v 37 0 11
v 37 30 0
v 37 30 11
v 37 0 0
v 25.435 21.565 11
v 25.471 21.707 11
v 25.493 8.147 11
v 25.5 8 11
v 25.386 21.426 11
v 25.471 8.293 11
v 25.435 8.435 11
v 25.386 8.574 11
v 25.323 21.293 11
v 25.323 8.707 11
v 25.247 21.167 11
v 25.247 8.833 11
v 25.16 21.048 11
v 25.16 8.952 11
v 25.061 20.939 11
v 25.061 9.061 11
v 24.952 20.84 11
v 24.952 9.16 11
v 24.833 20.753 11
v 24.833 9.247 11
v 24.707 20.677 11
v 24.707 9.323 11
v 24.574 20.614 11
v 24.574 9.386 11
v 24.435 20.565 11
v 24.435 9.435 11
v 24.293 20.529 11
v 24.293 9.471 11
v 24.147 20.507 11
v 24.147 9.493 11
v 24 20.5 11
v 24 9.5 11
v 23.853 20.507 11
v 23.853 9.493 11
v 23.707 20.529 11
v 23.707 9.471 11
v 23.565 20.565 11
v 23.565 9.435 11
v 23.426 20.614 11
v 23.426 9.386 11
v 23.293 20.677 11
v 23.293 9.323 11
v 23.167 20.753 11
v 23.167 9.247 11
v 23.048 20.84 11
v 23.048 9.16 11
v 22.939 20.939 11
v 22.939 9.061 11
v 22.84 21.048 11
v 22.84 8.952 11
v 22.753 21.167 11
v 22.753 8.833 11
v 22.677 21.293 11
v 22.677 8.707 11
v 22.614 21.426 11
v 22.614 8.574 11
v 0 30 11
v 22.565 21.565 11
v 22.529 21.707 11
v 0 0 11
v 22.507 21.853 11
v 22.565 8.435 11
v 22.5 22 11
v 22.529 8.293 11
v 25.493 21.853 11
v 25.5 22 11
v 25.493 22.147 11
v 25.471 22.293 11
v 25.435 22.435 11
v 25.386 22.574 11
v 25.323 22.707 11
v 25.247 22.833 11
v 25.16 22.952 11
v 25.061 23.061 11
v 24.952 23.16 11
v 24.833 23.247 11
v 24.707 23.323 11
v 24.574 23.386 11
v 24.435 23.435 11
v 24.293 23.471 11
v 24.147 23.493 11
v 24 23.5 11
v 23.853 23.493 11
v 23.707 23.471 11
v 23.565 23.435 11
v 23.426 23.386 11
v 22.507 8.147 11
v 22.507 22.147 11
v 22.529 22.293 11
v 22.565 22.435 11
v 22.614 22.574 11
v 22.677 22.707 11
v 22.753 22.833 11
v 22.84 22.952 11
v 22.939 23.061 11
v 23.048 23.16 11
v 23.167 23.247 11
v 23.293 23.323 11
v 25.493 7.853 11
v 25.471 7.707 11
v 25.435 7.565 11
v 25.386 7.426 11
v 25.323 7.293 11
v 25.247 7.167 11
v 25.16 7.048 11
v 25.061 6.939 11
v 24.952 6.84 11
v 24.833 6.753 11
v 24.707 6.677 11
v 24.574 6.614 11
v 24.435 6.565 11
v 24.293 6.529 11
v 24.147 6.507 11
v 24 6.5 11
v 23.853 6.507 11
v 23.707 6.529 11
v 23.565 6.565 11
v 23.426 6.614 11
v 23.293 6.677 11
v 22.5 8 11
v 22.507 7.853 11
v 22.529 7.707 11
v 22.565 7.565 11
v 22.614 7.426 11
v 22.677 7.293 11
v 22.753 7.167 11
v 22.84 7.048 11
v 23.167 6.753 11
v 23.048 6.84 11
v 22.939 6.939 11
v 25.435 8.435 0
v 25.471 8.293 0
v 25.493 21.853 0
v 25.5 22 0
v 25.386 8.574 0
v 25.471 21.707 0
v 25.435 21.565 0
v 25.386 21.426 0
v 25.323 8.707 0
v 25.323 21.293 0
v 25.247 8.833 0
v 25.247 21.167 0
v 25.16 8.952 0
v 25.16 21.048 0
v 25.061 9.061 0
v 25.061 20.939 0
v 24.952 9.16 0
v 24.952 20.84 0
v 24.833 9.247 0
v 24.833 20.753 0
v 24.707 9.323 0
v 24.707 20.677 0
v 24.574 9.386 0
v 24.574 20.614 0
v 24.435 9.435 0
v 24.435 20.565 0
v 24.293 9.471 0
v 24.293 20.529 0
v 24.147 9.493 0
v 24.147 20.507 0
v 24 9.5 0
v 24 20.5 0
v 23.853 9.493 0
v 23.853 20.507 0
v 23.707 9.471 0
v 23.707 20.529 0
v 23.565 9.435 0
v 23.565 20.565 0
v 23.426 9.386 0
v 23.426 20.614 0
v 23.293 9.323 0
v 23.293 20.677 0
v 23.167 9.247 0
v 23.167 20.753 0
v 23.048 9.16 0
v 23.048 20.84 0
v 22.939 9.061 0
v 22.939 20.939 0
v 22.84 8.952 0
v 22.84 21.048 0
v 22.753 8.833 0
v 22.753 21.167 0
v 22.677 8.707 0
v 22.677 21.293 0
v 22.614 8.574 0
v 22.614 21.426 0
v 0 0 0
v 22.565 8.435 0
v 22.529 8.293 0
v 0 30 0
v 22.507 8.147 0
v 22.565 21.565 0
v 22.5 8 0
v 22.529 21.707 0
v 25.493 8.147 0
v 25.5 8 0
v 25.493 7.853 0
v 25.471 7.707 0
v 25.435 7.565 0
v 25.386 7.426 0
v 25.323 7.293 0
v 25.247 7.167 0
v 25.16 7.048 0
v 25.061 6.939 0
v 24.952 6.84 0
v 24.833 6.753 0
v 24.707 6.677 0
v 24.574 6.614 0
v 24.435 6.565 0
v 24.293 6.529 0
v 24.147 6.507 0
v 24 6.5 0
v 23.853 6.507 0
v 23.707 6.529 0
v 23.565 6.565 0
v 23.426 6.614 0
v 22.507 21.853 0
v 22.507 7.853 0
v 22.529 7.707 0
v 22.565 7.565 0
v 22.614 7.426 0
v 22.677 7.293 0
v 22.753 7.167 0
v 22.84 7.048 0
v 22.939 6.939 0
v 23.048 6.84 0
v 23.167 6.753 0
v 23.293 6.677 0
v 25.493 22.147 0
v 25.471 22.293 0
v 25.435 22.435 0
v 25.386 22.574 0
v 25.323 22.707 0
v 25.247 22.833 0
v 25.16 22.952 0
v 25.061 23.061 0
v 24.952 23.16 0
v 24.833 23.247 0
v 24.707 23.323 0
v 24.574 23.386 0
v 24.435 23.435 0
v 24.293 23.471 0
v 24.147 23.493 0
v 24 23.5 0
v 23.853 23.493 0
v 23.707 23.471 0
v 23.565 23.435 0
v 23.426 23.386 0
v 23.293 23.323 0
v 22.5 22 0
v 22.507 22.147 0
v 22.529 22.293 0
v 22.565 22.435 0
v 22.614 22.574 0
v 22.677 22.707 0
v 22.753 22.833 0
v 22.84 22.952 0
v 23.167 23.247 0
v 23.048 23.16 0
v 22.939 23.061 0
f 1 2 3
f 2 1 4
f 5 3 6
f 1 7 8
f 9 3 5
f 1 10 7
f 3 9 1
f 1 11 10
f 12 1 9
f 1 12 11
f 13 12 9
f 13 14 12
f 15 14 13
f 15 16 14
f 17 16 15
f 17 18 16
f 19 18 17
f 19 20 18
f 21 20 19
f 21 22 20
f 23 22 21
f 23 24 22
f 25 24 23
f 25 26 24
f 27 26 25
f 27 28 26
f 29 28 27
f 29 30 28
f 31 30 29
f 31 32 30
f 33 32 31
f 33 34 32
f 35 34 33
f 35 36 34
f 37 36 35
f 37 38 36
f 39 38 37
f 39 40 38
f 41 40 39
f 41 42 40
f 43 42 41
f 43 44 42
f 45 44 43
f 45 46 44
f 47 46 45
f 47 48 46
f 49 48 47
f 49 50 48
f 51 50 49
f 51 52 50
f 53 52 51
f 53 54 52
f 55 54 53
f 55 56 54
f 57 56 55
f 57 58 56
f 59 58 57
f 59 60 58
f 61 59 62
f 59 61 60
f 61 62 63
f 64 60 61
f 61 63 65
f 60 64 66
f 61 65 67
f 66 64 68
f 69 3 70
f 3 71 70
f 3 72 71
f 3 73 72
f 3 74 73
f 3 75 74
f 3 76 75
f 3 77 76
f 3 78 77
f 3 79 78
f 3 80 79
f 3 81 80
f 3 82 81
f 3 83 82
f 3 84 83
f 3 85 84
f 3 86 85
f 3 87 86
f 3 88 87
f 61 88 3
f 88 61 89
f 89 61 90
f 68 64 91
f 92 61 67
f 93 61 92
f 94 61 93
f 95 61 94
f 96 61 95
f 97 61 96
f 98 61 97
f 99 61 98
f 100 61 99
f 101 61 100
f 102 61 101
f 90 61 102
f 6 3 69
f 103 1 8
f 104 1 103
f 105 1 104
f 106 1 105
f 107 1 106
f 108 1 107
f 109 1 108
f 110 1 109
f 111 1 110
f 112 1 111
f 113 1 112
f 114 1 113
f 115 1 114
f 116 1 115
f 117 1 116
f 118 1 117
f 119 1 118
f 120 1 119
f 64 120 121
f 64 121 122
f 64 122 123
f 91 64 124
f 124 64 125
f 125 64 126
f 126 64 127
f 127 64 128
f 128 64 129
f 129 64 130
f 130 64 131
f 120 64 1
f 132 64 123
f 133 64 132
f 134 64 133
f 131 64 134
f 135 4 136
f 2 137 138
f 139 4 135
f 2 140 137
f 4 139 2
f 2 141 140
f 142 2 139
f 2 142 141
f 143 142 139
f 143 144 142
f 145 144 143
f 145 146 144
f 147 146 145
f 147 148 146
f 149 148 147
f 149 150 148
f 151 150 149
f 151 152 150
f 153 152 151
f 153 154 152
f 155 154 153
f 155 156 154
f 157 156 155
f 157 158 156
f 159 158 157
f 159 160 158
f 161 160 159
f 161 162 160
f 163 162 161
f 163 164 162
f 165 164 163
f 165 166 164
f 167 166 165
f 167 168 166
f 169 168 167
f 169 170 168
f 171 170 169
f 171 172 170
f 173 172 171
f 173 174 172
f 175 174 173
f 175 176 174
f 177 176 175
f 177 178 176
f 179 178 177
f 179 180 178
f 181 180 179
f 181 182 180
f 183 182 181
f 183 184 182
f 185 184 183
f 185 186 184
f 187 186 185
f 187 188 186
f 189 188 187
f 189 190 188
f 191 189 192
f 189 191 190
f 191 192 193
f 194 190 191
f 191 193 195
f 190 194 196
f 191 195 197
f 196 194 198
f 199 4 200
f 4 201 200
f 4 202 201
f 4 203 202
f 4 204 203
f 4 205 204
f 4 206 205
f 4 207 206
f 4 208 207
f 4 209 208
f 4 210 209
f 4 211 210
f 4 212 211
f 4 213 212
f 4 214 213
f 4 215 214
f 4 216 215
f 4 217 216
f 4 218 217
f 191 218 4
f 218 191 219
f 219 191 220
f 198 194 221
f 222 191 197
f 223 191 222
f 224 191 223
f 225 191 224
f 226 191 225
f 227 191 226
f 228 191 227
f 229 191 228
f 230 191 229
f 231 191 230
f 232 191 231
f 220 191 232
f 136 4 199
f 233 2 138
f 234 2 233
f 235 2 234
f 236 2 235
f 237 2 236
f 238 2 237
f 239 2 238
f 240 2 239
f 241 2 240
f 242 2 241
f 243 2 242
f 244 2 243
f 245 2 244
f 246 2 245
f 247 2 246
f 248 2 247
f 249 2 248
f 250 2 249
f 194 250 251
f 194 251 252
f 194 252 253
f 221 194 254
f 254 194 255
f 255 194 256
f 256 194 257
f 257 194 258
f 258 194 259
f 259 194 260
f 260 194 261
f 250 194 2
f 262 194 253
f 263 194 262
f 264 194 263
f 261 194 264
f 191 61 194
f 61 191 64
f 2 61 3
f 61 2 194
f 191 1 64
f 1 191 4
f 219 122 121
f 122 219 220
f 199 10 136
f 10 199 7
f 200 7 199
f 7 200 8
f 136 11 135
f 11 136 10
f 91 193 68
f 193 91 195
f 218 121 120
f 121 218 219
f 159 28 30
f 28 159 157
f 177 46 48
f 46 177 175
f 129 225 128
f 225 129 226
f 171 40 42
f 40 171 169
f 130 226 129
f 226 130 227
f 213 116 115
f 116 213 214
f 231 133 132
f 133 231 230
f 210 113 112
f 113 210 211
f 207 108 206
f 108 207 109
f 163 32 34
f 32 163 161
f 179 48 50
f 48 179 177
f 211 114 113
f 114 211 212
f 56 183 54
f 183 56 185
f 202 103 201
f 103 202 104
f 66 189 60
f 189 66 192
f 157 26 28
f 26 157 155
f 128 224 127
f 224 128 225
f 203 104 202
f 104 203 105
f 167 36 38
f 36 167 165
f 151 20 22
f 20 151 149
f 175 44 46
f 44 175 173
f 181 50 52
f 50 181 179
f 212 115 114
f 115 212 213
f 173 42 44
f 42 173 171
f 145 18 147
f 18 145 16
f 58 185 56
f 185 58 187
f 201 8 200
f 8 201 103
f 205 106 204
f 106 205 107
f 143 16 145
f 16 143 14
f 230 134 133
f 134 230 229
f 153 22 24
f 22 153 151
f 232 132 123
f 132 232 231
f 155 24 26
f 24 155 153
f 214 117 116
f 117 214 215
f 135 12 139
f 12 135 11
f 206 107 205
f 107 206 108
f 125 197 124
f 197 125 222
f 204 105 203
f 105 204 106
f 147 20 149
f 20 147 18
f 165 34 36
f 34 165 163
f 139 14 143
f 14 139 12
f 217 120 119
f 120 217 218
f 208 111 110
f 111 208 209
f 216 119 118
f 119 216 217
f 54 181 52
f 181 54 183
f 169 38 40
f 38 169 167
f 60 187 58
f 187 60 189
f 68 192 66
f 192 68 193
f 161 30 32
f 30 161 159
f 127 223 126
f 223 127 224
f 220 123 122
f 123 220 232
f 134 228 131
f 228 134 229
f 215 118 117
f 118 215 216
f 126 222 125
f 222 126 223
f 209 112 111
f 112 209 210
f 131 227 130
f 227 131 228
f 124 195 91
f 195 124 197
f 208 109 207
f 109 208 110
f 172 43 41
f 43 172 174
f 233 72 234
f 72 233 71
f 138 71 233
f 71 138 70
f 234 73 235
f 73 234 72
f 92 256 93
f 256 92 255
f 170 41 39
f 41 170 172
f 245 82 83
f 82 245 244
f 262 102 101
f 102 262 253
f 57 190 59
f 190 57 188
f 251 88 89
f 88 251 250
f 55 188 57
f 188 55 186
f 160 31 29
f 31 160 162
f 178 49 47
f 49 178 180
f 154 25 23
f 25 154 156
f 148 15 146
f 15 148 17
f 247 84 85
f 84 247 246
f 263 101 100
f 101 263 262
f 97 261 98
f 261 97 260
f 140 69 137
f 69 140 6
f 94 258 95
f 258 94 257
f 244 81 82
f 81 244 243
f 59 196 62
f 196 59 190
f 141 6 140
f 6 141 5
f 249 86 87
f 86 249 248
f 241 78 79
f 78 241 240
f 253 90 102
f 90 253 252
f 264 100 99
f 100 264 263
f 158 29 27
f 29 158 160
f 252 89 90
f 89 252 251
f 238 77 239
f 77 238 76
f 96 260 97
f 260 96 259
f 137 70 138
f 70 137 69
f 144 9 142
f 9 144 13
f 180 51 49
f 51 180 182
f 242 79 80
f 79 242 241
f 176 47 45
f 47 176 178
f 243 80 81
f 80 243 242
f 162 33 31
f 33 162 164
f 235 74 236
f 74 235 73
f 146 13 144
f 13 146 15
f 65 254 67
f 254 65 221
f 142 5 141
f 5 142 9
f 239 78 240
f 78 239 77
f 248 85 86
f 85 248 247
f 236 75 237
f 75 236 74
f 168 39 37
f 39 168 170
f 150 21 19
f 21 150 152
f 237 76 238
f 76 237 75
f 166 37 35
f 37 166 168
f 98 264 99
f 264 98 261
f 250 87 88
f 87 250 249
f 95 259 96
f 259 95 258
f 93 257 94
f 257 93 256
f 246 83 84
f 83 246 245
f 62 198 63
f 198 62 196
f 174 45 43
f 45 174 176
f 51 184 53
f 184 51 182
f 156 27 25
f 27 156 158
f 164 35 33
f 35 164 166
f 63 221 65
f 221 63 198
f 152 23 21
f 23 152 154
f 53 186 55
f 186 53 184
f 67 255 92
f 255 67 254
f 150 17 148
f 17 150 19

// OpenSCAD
difference() {
    cube([37, 30, 11]);
    translate([24, 8, 0]) cylinder(d=3, h=11, $fn=64);
    translate([24, 8 + 14, 0]) cylinder(d=3, h=11, $fn=64);
}
    
